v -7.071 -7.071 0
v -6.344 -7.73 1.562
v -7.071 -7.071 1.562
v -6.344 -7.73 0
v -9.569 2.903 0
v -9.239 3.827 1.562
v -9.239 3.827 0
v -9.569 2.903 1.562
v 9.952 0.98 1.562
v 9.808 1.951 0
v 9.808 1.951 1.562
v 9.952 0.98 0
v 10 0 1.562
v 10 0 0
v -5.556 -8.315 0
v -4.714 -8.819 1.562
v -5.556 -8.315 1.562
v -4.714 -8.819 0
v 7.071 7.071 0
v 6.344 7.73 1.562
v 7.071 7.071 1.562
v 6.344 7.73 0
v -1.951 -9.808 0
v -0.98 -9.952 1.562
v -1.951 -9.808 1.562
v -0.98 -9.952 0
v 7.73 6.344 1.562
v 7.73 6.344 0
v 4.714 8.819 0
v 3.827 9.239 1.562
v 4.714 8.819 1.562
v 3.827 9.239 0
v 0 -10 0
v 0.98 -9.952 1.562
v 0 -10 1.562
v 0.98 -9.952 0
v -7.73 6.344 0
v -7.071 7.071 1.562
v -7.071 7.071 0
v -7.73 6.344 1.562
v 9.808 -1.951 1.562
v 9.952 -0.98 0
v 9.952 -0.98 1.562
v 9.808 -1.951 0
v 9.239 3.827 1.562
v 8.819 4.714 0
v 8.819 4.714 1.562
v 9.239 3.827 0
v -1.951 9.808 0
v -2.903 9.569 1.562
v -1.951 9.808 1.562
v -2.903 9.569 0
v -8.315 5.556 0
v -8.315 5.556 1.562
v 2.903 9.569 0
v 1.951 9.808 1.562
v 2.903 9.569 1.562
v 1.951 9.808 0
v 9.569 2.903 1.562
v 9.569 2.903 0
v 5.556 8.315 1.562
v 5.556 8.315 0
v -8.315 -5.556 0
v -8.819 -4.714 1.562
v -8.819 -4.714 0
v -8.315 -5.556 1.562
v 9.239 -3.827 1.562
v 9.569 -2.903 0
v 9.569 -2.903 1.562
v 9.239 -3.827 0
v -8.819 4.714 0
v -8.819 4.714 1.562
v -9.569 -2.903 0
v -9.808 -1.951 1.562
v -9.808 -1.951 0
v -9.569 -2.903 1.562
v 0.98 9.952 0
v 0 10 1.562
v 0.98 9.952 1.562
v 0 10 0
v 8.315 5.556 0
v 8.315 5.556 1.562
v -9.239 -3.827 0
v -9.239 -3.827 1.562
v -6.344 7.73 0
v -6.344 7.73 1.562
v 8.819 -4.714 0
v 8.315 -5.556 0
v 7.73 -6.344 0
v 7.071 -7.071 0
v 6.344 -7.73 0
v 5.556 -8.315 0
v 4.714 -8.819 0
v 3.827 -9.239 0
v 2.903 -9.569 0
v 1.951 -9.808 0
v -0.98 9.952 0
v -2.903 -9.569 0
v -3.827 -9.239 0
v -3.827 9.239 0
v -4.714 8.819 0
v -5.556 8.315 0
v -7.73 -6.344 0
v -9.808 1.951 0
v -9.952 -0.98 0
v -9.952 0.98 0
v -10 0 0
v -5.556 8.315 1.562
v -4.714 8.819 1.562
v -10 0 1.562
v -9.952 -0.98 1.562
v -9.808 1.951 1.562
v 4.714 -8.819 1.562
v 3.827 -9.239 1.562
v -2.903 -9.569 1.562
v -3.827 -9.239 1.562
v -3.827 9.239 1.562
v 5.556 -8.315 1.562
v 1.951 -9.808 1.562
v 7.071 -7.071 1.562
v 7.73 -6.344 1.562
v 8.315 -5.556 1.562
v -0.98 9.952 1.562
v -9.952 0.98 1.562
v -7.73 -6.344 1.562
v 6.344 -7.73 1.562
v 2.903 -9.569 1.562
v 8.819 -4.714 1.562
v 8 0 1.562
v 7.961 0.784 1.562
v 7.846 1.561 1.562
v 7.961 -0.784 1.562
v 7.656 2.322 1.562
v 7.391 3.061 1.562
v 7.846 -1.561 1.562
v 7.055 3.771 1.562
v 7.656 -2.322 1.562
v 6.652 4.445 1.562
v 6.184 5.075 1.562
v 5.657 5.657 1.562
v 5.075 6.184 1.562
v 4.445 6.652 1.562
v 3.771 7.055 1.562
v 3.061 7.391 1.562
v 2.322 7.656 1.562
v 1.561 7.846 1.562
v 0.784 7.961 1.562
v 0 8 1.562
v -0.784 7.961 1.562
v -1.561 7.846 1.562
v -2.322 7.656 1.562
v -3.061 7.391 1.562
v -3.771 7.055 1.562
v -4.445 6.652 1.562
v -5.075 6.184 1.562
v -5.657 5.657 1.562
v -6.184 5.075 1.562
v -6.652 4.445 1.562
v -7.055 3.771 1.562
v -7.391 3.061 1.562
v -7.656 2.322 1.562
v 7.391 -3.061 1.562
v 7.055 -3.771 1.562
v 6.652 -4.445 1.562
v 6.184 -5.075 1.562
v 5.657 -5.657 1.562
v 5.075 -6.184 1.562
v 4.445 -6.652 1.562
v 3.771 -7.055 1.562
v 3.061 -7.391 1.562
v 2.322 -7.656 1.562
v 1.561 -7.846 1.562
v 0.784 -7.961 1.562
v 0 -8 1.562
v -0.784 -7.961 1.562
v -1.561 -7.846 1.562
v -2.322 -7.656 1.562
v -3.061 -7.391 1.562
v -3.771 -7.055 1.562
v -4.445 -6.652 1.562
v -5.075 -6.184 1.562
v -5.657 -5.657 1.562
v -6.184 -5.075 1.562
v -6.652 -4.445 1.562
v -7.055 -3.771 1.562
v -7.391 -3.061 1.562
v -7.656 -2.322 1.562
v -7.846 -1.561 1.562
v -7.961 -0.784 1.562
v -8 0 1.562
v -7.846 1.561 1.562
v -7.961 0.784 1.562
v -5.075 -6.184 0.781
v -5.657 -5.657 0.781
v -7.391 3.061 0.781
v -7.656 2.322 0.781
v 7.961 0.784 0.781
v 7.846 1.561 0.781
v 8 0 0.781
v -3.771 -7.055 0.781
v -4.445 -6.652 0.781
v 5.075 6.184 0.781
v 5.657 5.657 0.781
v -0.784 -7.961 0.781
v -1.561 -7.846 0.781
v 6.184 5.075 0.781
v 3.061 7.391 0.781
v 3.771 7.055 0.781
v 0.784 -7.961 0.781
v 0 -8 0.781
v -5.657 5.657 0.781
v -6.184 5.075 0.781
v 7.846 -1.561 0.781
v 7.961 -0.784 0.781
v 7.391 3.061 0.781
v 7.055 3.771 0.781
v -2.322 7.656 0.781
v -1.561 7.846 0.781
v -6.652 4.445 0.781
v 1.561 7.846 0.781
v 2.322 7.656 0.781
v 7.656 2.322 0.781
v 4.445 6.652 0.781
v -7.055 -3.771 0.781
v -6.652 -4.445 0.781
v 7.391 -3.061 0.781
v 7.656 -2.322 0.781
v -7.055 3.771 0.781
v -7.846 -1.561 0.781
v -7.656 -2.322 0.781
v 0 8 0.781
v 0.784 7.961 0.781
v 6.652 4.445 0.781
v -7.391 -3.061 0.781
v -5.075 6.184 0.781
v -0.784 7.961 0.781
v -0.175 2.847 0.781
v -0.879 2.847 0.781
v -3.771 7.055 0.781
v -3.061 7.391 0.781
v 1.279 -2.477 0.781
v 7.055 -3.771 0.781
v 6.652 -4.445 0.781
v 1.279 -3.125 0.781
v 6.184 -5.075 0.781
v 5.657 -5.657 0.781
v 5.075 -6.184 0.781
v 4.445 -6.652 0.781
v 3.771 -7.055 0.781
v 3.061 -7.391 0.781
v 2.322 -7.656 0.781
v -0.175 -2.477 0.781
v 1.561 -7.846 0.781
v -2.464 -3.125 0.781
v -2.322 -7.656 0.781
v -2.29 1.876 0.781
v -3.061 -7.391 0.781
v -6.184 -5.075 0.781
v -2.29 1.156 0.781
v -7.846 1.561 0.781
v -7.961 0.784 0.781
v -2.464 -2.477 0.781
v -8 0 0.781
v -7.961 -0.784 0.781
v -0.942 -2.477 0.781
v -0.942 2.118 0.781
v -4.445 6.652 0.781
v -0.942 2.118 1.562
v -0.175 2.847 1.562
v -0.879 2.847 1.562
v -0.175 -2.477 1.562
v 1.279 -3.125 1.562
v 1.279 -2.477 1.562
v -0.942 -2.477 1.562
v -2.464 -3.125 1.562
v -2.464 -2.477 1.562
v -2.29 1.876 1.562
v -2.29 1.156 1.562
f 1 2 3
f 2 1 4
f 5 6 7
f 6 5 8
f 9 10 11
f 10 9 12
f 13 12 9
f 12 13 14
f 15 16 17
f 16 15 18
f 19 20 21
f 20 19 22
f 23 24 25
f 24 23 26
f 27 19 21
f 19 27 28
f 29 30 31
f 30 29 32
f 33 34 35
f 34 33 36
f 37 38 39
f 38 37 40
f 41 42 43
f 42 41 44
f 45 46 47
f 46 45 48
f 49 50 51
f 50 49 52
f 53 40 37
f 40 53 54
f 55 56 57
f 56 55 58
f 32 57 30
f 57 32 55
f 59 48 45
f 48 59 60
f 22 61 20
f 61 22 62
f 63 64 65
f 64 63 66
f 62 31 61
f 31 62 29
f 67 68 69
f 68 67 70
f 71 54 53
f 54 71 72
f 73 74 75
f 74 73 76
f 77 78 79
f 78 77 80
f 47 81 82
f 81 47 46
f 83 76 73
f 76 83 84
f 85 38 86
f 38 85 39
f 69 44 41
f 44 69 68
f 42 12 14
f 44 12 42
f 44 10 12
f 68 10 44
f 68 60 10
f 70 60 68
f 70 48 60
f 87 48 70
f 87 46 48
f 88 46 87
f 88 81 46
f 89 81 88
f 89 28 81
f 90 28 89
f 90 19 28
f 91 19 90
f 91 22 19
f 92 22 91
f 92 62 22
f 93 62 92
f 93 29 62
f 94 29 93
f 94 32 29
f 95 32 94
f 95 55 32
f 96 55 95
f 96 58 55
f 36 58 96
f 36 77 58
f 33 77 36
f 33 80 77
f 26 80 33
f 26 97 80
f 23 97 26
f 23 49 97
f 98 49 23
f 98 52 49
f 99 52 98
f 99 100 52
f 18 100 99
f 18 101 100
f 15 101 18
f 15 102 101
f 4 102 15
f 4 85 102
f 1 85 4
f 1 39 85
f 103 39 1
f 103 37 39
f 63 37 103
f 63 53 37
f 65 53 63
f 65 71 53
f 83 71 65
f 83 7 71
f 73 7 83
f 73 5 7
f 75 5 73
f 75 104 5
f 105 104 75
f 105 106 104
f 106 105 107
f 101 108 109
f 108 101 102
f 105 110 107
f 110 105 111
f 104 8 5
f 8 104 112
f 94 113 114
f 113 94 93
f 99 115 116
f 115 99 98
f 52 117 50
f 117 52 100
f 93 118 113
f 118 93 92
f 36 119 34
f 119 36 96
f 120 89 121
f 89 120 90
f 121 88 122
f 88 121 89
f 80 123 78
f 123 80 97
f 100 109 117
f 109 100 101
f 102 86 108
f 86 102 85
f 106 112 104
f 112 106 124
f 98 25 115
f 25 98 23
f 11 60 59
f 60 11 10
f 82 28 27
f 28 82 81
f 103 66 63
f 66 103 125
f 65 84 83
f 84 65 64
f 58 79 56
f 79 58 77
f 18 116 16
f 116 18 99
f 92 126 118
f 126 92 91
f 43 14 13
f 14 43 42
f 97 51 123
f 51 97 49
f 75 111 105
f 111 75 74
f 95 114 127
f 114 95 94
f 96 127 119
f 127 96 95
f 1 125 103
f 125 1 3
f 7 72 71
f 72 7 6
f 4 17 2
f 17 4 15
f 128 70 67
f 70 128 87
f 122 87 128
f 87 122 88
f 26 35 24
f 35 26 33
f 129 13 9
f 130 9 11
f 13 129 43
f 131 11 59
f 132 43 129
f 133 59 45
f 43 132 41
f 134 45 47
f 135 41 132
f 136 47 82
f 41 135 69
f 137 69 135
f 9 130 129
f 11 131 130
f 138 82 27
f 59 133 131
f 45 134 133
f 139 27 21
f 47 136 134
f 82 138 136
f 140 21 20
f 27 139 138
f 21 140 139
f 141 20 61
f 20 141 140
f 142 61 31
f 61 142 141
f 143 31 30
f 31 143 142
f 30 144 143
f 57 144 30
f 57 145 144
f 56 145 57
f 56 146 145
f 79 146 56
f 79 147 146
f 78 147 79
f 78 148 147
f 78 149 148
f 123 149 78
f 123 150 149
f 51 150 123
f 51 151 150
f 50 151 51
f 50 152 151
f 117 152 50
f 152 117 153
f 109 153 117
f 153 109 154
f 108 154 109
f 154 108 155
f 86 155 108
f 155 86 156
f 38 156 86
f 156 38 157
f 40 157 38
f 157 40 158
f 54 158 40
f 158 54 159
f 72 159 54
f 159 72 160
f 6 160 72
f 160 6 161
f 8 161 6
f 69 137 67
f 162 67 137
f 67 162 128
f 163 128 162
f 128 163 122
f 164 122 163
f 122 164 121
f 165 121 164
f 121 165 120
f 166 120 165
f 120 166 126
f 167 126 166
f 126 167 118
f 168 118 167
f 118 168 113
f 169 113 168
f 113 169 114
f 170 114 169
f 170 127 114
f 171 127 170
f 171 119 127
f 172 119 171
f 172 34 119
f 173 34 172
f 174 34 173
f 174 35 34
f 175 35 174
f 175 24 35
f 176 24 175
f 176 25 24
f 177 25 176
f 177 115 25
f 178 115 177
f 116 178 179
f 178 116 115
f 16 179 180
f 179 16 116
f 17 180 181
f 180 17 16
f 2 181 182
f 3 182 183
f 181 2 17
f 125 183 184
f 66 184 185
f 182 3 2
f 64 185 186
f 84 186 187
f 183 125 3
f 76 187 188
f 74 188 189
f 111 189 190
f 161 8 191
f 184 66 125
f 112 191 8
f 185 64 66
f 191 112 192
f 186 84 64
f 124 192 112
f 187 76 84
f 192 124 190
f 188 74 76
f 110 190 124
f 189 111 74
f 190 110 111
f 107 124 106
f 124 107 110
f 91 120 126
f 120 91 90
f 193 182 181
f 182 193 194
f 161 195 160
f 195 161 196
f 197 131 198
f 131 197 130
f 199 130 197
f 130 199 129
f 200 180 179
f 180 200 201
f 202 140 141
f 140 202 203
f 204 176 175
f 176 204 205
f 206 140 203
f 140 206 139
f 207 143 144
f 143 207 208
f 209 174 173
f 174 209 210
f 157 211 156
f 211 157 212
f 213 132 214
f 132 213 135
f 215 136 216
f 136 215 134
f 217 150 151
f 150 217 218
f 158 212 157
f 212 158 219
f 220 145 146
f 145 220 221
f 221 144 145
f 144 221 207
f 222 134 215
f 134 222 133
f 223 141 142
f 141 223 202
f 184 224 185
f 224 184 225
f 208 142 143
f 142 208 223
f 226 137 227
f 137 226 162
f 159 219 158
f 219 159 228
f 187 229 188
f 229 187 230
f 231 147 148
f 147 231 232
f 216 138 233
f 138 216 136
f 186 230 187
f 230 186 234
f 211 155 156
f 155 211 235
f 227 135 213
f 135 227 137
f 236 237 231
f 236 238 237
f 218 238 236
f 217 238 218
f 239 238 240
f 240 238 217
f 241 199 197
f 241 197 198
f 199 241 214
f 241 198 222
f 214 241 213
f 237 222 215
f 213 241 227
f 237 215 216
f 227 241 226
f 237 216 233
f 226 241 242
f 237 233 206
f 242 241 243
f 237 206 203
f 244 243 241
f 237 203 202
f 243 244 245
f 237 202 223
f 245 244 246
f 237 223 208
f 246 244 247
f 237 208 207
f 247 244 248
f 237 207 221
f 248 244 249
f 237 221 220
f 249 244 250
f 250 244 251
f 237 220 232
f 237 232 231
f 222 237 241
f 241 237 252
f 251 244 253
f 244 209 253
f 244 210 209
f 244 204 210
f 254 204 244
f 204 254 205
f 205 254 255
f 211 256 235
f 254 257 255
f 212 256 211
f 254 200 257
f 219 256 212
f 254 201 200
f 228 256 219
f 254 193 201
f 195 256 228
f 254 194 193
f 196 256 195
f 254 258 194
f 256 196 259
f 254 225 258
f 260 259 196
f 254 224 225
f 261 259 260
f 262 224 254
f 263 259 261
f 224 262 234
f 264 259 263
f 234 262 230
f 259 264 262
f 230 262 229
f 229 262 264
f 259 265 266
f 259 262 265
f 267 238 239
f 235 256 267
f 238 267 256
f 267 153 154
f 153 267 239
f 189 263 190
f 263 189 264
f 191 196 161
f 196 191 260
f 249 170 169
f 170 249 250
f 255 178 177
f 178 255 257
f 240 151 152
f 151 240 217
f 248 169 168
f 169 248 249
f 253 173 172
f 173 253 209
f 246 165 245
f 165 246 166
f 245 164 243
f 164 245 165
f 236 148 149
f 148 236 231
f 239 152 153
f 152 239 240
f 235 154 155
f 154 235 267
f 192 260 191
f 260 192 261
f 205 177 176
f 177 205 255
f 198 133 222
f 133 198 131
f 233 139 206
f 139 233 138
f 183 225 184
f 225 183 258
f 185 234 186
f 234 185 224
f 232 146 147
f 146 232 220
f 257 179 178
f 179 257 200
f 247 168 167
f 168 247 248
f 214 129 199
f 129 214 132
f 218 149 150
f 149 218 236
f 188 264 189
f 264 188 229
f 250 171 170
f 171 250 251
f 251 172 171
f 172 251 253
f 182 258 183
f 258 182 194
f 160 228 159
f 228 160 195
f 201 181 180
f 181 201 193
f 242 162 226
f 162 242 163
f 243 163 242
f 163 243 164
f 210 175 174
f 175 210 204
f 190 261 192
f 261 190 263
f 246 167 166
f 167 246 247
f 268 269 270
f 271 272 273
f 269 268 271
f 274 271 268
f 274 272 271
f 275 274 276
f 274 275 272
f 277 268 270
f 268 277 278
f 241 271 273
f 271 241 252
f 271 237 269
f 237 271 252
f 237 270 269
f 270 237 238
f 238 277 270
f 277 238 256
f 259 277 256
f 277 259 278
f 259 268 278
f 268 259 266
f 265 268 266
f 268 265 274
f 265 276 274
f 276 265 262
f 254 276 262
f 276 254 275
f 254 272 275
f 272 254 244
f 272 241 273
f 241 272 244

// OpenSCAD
$fn = 64;

size_index = 100;
button_radius = size_index/10;
rim_size = size_index/100;
internal_radius = button_radius - rim_size*2;
//button_height = 1.8;
button_height = size_index/64;
button_drop = button_height/2;
font_size = size_index/16;

text = "Align";
 font = "Liberation Sans";
 
 valign = [
   [  0, "top"],
   [ 40, "center"],
   [ 75, "baseline"],
   [110, "bottom"]
 ];
 
difference() {
    cylinder(r = button_radius, h = button_height);
    translate([0, 0, button_drop]) {
        cylinder(r = internal_radius, h = button_drop);
    }
    
}


content = "1";
font = "Liberation Sans";

translate ([-(font_size/2),-(font_size/2),0]) {
   linear_extrude(height = button_height) {
       text(content, font = font, size = font_size);
     }
 }
 /*
projection() {
    translate([0,0,button_drop*sqrt(2)]) {
        text("asdf", halign=50);
    }
}
*/
